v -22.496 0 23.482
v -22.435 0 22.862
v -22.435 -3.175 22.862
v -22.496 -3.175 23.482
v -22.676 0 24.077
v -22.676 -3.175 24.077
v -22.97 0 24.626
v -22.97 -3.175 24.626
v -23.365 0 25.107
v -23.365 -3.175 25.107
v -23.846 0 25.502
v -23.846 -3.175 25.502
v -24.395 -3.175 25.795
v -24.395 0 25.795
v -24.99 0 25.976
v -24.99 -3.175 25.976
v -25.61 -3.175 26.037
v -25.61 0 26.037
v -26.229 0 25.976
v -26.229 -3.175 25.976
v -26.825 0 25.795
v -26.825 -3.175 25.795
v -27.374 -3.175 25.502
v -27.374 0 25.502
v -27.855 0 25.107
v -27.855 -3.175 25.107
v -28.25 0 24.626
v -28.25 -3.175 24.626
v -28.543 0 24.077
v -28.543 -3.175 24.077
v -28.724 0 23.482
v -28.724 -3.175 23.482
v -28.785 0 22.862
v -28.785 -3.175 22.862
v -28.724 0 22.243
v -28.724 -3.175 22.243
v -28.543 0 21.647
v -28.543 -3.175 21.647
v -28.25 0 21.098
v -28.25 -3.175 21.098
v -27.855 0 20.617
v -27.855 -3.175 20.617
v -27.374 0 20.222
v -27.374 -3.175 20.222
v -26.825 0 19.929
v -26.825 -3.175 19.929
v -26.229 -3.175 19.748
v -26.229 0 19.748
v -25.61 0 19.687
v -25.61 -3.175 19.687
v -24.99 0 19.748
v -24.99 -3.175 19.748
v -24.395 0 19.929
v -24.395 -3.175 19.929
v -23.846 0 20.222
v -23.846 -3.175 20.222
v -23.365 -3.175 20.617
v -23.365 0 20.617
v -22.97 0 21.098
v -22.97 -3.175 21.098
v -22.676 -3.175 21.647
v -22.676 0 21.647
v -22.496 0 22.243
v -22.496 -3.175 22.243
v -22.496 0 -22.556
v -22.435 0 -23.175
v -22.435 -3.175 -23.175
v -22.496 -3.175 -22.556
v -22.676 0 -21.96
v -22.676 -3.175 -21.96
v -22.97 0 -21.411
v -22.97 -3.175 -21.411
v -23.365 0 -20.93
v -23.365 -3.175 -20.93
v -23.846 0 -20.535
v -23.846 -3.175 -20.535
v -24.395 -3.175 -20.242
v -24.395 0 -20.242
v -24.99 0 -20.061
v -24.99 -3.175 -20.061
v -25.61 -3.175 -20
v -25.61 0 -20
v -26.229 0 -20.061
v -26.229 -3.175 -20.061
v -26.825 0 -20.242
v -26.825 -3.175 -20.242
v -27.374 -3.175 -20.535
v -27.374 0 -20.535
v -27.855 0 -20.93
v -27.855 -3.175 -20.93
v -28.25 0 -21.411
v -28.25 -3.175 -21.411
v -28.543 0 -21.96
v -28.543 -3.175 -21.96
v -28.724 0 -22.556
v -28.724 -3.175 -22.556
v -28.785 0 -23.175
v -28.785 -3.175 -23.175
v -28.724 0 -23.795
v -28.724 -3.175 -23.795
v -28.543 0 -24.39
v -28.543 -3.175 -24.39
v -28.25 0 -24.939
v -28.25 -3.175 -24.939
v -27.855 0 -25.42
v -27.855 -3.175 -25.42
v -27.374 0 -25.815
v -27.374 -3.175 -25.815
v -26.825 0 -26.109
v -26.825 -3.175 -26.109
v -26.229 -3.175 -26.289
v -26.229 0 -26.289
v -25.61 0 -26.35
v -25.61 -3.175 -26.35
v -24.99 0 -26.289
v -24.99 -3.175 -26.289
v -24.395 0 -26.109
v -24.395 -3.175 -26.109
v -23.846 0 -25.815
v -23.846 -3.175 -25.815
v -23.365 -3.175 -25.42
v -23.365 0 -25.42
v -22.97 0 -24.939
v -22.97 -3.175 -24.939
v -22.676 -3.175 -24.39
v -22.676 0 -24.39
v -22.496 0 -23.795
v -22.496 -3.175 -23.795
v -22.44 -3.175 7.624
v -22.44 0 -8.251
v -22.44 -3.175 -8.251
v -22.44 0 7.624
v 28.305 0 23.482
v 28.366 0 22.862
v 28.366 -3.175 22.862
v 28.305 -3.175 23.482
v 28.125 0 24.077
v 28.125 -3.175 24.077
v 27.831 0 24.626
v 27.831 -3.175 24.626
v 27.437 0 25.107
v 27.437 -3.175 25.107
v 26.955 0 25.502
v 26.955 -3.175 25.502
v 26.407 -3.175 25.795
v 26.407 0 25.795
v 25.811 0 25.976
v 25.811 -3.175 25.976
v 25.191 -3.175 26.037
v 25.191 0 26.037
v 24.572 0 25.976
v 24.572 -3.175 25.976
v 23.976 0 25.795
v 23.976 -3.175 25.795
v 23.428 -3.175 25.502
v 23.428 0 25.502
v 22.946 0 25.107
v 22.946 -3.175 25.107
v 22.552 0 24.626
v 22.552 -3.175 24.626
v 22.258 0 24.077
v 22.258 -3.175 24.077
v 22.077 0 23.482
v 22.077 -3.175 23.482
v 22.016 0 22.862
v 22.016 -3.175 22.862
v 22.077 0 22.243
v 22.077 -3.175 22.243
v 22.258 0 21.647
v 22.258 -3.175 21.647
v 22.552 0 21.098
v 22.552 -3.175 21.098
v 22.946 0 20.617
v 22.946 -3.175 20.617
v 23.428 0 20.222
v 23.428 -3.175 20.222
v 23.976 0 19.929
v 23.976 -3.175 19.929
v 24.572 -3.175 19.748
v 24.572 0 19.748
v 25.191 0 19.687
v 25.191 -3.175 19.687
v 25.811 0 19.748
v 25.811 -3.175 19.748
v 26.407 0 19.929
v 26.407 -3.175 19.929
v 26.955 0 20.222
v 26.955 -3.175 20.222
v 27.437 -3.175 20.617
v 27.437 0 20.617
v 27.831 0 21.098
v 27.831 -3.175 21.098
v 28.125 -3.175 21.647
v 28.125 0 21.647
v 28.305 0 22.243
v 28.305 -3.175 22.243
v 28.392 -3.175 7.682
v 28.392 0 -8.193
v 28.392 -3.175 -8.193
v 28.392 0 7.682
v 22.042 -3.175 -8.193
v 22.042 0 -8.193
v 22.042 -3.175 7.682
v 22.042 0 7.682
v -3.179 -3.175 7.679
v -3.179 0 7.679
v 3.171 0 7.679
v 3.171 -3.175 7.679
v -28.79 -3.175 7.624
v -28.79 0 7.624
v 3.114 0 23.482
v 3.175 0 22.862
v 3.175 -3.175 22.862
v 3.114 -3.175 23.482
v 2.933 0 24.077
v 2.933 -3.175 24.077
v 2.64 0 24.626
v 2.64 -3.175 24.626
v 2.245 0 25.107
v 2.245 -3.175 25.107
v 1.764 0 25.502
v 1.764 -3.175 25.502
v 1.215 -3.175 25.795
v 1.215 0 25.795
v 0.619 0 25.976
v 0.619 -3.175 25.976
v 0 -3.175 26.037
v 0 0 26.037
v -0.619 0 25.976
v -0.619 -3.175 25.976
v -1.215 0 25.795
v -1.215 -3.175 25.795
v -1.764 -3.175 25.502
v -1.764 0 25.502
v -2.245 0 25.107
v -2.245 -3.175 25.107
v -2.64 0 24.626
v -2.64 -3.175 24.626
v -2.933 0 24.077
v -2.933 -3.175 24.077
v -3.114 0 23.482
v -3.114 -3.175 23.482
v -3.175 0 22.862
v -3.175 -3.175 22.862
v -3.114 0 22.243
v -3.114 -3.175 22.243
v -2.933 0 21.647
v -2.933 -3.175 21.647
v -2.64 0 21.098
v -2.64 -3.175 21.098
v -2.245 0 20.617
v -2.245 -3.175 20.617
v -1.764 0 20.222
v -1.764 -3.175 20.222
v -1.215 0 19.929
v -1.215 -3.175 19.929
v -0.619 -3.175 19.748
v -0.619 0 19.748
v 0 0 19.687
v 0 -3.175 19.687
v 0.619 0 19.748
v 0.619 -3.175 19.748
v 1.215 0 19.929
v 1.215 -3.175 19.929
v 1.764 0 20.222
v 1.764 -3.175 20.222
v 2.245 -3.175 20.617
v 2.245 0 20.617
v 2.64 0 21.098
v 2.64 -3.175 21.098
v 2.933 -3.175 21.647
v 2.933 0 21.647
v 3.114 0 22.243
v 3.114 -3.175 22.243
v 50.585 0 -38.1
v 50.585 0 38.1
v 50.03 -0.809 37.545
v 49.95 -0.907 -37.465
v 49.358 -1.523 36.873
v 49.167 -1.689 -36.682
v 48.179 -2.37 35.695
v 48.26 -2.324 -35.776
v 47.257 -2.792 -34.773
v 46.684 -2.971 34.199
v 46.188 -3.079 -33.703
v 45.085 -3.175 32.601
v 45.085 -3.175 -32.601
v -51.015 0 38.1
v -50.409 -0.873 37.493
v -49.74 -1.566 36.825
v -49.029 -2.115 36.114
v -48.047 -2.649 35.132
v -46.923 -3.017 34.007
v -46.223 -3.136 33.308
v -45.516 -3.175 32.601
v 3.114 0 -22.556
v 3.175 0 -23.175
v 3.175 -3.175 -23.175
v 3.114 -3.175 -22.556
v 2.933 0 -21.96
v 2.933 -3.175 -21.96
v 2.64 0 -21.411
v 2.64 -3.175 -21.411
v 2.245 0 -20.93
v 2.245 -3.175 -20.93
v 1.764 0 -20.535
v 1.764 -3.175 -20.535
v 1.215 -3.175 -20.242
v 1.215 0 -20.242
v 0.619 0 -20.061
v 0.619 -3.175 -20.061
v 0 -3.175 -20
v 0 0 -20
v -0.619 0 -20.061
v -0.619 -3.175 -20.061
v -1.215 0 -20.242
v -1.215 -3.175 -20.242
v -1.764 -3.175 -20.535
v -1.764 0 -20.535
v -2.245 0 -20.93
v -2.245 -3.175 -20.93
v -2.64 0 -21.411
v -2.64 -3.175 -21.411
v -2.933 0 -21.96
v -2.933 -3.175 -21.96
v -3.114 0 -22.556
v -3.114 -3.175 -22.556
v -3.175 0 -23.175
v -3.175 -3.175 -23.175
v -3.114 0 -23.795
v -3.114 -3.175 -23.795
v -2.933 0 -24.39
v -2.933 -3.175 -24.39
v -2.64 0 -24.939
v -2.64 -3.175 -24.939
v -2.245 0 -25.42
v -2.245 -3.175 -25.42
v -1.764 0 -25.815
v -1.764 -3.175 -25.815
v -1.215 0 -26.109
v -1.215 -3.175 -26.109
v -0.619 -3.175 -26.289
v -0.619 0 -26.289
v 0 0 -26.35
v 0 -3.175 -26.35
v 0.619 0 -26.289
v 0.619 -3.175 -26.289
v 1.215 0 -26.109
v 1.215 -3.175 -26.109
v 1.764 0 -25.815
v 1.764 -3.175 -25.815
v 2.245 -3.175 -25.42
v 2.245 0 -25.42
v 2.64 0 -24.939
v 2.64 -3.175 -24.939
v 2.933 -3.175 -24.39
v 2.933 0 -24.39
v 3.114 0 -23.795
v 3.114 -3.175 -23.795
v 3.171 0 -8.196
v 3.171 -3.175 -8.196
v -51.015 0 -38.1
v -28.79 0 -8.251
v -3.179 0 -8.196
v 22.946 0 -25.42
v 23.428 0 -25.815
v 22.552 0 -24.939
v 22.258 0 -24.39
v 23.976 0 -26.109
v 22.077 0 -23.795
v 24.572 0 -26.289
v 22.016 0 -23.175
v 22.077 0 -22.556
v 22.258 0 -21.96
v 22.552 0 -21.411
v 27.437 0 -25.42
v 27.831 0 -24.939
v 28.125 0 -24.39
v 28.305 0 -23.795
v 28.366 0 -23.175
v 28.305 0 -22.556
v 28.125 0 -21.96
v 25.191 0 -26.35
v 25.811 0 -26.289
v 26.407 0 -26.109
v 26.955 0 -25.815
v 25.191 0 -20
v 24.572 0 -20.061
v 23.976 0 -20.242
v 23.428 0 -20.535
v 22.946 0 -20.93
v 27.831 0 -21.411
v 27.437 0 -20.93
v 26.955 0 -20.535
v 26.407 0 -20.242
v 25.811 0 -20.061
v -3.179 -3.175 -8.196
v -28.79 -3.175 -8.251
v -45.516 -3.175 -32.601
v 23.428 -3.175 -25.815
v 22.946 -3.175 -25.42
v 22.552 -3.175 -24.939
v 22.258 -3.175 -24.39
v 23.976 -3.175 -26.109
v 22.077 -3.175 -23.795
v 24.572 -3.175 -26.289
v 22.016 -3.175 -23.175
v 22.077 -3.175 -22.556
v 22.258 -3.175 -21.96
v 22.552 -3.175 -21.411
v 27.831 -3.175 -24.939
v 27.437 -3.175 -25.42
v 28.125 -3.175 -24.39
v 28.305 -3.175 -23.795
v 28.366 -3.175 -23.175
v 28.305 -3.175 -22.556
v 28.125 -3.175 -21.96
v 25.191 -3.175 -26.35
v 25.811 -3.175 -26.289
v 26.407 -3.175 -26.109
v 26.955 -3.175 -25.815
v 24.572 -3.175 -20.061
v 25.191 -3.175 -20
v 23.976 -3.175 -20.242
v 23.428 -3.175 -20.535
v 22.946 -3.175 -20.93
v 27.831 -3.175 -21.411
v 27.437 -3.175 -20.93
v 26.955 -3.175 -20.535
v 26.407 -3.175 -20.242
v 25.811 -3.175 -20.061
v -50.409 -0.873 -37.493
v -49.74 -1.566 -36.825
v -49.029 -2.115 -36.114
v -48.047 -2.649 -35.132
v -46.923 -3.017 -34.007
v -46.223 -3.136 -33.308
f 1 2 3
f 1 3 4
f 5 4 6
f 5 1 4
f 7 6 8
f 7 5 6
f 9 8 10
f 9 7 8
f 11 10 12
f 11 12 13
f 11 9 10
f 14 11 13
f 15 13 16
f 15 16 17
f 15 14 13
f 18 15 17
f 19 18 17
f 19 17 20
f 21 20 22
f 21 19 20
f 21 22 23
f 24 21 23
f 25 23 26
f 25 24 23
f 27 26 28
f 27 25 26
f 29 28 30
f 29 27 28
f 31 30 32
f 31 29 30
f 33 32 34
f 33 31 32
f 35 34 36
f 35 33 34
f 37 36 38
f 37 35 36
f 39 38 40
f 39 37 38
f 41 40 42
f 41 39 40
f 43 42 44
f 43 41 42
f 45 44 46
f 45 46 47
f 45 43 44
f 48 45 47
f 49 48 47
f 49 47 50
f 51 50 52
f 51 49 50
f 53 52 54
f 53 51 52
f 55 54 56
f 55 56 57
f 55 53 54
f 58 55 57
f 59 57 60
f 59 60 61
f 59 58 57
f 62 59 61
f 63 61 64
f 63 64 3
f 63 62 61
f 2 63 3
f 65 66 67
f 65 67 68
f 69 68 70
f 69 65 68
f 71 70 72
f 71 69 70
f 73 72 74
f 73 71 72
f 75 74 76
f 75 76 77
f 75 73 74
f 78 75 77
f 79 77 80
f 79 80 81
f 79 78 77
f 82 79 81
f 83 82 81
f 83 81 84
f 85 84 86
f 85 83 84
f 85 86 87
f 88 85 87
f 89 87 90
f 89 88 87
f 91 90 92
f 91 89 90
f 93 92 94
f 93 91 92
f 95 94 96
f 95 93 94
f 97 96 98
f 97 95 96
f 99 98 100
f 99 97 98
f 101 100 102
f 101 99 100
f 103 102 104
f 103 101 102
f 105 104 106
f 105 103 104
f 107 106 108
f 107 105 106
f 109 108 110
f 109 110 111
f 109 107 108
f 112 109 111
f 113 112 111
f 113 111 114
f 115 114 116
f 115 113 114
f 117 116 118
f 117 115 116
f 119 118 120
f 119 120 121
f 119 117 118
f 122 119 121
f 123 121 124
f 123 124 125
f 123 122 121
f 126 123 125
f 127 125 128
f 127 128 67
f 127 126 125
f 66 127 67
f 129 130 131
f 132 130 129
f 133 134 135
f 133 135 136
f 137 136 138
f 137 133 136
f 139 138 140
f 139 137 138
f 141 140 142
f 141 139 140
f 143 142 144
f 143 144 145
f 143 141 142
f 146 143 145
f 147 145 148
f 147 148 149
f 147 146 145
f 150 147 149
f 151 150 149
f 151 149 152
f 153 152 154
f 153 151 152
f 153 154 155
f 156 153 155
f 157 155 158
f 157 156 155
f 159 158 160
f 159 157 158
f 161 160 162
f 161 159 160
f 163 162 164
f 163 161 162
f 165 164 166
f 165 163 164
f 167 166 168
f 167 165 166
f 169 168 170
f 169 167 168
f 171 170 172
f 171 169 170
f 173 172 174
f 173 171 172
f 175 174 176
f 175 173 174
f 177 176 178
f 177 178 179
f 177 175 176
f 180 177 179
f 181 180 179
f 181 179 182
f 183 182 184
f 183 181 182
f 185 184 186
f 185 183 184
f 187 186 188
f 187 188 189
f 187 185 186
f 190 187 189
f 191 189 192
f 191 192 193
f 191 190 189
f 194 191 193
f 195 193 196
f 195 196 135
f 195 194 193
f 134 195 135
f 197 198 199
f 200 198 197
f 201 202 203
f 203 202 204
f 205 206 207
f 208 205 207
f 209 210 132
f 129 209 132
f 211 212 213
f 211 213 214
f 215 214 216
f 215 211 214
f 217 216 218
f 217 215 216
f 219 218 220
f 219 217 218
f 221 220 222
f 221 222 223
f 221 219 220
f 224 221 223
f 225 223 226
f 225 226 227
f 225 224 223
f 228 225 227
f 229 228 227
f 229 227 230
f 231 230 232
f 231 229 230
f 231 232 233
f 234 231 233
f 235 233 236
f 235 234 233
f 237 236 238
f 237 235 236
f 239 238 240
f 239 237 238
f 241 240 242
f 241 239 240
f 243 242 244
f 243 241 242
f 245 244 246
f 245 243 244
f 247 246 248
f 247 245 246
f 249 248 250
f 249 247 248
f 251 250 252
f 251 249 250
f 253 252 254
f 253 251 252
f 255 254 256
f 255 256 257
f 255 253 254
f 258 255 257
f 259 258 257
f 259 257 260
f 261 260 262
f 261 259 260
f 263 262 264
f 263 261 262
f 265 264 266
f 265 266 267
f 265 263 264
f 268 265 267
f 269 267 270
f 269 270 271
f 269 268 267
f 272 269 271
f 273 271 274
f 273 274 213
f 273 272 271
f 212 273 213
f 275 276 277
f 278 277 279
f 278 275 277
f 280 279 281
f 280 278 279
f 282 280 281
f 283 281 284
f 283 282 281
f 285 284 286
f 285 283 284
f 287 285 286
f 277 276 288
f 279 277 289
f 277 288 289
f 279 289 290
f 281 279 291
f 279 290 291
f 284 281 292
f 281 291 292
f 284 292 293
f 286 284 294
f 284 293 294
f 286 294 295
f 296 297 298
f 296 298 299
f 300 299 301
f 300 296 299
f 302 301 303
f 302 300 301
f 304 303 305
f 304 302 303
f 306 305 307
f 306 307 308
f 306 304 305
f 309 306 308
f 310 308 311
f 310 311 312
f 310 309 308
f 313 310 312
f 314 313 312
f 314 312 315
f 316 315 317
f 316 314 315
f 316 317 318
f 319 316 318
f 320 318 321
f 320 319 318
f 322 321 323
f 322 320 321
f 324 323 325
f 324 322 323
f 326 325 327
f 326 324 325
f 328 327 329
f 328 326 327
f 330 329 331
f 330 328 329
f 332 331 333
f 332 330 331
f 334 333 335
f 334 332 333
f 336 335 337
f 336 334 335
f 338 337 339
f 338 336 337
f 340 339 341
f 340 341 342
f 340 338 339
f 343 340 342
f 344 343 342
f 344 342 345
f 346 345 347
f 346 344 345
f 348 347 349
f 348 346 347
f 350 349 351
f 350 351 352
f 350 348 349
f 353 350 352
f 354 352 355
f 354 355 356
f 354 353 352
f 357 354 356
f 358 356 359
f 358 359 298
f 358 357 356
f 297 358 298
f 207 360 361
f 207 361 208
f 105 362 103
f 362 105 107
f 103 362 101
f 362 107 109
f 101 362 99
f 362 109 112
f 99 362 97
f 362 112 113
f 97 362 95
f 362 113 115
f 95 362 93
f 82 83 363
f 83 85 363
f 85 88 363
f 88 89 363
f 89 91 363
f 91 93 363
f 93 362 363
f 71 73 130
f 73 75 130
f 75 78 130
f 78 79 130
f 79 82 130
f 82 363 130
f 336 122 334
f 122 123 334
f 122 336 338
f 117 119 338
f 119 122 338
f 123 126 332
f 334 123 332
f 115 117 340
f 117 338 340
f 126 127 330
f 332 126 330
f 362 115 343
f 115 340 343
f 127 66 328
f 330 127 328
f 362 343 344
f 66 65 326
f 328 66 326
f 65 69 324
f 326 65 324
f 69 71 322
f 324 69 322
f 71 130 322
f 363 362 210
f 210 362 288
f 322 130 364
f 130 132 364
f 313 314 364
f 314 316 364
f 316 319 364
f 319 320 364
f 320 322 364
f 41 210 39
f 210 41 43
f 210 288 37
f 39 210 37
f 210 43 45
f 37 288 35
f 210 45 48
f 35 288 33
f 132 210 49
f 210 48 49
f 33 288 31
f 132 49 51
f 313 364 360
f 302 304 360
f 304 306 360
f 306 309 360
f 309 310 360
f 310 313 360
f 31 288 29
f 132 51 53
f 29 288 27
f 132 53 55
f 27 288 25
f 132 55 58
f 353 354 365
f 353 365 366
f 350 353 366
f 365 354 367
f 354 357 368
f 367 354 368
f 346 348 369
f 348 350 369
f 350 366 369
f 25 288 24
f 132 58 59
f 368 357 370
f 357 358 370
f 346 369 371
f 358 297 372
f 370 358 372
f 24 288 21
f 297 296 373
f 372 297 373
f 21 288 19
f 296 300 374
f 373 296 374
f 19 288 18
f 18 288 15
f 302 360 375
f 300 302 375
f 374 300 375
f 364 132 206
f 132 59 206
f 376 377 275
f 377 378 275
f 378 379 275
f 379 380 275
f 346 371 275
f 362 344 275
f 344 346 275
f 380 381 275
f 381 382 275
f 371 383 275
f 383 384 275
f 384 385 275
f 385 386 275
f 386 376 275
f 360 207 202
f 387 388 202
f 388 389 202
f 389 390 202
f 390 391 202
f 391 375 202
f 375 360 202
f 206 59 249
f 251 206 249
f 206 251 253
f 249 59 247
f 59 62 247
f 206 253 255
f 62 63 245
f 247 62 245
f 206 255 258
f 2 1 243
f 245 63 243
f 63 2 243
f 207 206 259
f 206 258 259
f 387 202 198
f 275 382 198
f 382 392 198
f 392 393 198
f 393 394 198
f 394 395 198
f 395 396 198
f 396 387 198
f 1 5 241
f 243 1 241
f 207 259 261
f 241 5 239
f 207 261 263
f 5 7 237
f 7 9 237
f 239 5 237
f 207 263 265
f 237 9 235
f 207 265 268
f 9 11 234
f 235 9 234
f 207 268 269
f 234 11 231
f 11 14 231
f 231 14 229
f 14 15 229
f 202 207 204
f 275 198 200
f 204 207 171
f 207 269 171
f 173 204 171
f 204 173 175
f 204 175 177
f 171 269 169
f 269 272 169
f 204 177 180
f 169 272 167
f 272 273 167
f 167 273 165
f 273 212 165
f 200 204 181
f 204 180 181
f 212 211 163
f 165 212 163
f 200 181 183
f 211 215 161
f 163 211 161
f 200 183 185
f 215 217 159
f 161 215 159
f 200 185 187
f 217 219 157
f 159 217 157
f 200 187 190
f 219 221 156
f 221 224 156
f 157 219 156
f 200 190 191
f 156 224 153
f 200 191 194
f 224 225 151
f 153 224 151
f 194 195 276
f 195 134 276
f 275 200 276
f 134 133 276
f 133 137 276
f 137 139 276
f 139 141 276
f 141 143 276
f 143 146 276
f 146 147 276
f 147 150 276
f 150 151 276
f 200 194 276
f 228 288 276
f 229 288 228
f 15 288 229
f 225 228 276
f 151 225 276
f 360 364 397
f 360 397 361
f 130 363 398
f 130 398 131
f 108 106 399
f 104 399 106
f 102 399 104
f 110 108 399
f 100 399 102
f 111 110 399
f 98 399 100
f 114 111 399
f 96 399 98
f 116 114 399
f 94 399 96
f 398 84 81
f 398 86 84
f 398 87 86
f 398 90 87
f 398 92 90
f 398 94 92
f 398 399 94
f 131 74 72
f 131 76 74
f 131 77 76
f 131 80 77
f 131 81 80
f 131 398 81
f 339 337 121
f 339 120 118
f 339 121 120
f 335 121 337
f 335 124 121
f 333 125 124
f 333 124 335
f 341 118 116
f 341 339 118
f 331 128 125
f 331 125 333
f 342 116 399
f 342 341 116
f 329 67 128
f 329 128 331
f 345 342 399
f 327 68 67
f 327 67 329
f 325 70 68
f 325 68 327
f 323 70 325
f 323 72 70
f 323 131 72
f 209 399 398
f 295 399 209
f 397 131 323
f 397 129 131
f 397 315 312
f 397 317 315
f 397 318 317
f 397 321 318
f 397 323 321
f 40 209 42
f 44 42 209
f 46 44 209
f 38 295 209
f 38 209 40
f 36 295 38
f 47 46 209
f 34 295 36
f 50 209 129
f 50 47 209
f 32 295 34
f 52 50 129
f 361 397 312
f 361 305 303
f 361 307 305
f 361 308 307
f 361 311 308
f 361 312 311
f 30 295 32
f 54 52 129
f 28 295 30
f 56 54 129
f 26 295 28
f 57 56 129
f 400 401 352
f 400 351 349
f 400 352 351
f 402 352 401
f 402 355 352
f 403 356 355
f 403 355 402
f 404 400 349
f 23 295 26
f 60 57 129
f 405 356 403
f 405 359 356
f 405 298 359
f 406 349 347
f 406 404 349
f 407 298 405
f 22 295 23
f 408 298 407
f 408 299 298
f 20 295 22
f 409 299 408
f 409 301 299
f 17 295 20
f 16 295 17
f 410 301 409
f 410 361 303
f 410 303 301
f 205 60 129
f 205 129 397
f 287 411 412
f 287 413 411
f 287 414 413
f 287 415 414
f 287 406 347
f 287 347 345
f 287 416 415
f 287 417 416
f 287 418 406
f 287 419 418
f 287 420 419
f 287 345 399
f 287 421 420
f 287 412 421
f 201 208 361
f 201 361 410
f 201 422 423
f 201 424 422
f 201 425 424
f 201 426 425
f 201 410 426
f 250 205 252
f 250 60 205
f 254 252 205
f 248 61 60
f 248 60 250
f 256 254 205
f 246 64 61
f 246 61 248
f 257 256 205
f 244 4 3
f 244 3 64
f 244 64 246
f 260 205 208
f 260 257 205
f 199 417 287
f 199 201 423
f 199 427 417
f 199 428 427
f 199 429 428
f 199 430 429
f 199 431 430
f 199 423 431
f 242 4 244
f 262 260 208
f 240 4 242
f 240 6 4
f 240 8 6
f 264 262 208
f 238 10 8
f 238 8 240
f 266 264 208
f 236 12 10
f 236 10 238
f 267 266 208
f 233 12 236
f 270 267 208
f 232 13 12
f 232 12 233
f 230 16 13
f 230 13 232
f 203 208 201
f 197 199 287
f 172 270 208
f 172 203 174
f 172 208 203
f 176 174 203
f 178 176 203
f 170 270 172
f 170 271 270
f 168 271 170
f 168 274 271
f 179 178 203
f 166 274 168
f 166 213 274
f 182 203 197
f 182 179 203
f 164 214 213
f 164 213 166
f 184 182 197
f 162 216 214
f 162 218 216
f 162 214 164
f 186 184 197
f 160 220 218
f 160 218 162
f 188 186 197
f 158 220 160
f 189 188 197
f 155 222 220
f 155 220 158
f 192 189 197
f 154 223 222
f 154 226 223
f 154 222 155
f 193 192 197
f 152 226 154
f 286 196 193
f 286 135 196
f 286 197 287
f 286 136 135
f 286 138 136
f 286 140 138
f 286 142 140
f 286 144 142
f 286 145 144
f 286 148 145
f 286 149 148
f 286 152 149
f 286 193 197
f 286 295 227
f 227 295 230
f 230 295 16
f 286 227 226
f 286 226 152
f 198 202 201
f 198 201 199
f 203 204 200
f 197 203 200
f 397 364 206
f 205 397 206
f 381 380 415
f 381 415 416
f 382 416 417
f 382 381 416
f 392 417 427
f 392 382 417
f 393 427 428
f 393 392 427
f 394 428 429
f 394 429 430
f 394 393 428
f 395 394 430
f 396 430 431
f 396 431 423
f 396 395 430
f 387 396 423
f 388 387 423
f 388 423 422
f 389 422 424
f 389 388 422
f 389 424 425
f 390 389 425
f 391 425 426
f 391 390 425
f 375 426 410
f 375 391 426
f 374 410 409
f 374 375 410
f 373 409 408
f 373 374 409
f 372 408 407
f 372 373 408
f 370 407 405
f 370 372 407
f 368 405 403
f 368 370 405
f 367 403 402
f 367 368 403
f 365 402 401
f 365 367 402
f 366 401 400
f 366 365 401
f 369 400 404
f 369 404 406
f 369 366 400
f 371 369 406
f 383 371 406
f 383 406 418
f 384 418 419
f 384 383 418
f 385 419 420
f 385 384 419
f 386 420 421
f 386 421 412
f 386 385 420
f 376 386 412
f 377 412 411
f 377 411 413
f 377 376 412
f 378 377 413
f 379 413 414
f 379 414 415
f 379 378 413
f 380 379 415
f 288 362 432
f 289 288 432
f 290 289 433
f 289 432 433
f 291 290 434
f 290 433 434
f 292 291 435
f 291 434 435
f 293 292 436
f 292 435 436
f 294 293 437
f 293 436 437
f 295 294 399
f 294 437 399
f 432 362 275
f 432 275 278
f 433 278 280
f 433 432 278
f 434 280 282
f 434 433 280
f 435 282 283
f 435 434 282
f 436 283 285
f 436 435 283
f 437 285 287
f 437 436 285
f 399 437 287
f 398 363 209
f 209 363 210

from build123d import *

# Parameters (mm, degrees)
F0_R        = 3.175
F0_W        = 6.35
F0_H        = 15.875
F1_DEPTH    = 3.175
F2_T1_DEPTH = 129.0963065702
F3_T1_DEPTH = 98.1970452562
F4_T1_DEPTH = 98.1970452562
F5_T1_DEPTH = 118.0977839421


# Not quite as in the source:
# - a fillet or chamfer that OpenCascade refuses, or shapes differently, is made with other operations: its cross-section is extruded or revolved along the edge and cut away or added
# - a length typed as a fraction of an inch, garbled in the dataset ("3 / 203.2 mm" for 3/8 in), is restored


with BuildPart() as f1:
    # F0 (on Front) → F1 (new body)
    with BuildSketch(Plane.XZ):
        Polygon((-0.2153298438, 38.1), (-51.0153298438, 38.1), (-51.0153298438, 0), (-51.0153298438, -8.2507394254), (-51.0153298438, -38.1), (50.5846701562, -38.1), (50.5846701562, 7.6242605746), (50.5846701562, 38.1), align=None)
        with Locations((-25.6096087396, -23.1753697127)):
            Circle(F0_R, mode=Mode.SUBTRACT)
        with Locations((-25.6145072252, -0.3132394254)):
            Rectangle(F0_W, F0_H, mode=Mode.SUBTRACT)
        with Locations((0, -23.1753697127)):
            Circle(F0_R, mode=Mode.SUBTRACT)
        with Locations((25.1914858818, -23.1753697127)):
            Circle(F0_R, mode=Mode.SUBTRACT)
        with Locations((-0.0039746718, -0.2589693381)):
            Rectangle(F0_W, F0_H, mode=Mode.SUBTRACT)
        with Locations((25.21736947, -0.2557926551)):
            Rectangle(F0_W, F0_H, mode=Mode.SUBTRACT)
        with Locations((-25.6096087396, 22.8621302873)):
            Circle(F0_R, mode=Mode.SUBTRACT)
        with Locations((0, 22.8621302873)):
            Circle(F0_R, mode=Mode.SUBTRACT)
        with Locations((25.1914858818, 22.8621302873)):
            Circle(F0_R, mode=Mode.SUBTRACT)
    extrude(amount=F1_DEPTH)

    # F2: fillet of radius 6.35 on 1 edges, made by hand

    # F2_s2 → F2_t1 (cut)
    with BuildSketch(Plane.YZ.offset(-64.7634831288)):
        with BuildLine():
            ThreePointArc((0, 38.1), (-2.324261314, 35.775738686), (-3.175, 32.600738686))
            Line((-3.175, 32.600738686), (-3.175, 38.1))
            Line((-3.175, 38.1), (0, 38.1))
        make_face()
    extrude(amount=F2_T1_DEPTH, mode=Mode.SUBTRACT)

    # F3: fillet of radius 6.35 on 1 edges, made by hand

    # F3_s2 → F3_t1 (cut)
    with BuildSketch(Plane.XY.offset(-51.8481532851)):
        with BuildLine():
            ThreePointArc((-51.0153298438, 0), (-48.6910685297, -2.324261314), (-45.5160685297, -3.175))
            Line((-45.5160685297, -3.175), (-51.0153298438, -3.175))
            Line((-51.0153298438, -3.175), (-51.0153298438, 0))
        make_face()
    extrude(amount=F3_T1_DEPTH, mode=Mode.SUBTRACT)

    # F4: fillet of radius 6.35 on 1 edges, made by hand

    # F4_s2 → F4_t1 (cut)
    with BuildSketch(Plane.XY.offset(-51.8481532851)):
        with BuildLine():
            ThreePointArc((50.5846701562, 0), (48.2604088422, -2.324261314), (45.0854088422, -3.175))
            Line((45.0854088422, -3.175), (50.5846701562, -3.175))
            Line((50.5846701562, -3.175), (50.5846701562, 0))
        make_face()
    extrude(amount=F4_T1_DEPTH, mode=Mode.SUBTRACT)

    # F5: fillet of radius 6.35 on 1 edges, made by hand

    # F5_s2 → F5_t1 (cut)
    with BuildSketch(Plane.YZ.offset(-59.2642218148)):
        with BuildLine():
            ThreePointArc((0, -38.1), (-2.324261314, -35.775738686), (-3.175, -32.600738686))
            Line((-3.175, -32.600738686), (-3.175, -38.1))
            Line((-3.175, -38.1), (0, -38.1))
        make_face()
    extrude(amount=F5_T1_DEPTH, mode=Mode.SUBTRACT)


solid = f1.part
